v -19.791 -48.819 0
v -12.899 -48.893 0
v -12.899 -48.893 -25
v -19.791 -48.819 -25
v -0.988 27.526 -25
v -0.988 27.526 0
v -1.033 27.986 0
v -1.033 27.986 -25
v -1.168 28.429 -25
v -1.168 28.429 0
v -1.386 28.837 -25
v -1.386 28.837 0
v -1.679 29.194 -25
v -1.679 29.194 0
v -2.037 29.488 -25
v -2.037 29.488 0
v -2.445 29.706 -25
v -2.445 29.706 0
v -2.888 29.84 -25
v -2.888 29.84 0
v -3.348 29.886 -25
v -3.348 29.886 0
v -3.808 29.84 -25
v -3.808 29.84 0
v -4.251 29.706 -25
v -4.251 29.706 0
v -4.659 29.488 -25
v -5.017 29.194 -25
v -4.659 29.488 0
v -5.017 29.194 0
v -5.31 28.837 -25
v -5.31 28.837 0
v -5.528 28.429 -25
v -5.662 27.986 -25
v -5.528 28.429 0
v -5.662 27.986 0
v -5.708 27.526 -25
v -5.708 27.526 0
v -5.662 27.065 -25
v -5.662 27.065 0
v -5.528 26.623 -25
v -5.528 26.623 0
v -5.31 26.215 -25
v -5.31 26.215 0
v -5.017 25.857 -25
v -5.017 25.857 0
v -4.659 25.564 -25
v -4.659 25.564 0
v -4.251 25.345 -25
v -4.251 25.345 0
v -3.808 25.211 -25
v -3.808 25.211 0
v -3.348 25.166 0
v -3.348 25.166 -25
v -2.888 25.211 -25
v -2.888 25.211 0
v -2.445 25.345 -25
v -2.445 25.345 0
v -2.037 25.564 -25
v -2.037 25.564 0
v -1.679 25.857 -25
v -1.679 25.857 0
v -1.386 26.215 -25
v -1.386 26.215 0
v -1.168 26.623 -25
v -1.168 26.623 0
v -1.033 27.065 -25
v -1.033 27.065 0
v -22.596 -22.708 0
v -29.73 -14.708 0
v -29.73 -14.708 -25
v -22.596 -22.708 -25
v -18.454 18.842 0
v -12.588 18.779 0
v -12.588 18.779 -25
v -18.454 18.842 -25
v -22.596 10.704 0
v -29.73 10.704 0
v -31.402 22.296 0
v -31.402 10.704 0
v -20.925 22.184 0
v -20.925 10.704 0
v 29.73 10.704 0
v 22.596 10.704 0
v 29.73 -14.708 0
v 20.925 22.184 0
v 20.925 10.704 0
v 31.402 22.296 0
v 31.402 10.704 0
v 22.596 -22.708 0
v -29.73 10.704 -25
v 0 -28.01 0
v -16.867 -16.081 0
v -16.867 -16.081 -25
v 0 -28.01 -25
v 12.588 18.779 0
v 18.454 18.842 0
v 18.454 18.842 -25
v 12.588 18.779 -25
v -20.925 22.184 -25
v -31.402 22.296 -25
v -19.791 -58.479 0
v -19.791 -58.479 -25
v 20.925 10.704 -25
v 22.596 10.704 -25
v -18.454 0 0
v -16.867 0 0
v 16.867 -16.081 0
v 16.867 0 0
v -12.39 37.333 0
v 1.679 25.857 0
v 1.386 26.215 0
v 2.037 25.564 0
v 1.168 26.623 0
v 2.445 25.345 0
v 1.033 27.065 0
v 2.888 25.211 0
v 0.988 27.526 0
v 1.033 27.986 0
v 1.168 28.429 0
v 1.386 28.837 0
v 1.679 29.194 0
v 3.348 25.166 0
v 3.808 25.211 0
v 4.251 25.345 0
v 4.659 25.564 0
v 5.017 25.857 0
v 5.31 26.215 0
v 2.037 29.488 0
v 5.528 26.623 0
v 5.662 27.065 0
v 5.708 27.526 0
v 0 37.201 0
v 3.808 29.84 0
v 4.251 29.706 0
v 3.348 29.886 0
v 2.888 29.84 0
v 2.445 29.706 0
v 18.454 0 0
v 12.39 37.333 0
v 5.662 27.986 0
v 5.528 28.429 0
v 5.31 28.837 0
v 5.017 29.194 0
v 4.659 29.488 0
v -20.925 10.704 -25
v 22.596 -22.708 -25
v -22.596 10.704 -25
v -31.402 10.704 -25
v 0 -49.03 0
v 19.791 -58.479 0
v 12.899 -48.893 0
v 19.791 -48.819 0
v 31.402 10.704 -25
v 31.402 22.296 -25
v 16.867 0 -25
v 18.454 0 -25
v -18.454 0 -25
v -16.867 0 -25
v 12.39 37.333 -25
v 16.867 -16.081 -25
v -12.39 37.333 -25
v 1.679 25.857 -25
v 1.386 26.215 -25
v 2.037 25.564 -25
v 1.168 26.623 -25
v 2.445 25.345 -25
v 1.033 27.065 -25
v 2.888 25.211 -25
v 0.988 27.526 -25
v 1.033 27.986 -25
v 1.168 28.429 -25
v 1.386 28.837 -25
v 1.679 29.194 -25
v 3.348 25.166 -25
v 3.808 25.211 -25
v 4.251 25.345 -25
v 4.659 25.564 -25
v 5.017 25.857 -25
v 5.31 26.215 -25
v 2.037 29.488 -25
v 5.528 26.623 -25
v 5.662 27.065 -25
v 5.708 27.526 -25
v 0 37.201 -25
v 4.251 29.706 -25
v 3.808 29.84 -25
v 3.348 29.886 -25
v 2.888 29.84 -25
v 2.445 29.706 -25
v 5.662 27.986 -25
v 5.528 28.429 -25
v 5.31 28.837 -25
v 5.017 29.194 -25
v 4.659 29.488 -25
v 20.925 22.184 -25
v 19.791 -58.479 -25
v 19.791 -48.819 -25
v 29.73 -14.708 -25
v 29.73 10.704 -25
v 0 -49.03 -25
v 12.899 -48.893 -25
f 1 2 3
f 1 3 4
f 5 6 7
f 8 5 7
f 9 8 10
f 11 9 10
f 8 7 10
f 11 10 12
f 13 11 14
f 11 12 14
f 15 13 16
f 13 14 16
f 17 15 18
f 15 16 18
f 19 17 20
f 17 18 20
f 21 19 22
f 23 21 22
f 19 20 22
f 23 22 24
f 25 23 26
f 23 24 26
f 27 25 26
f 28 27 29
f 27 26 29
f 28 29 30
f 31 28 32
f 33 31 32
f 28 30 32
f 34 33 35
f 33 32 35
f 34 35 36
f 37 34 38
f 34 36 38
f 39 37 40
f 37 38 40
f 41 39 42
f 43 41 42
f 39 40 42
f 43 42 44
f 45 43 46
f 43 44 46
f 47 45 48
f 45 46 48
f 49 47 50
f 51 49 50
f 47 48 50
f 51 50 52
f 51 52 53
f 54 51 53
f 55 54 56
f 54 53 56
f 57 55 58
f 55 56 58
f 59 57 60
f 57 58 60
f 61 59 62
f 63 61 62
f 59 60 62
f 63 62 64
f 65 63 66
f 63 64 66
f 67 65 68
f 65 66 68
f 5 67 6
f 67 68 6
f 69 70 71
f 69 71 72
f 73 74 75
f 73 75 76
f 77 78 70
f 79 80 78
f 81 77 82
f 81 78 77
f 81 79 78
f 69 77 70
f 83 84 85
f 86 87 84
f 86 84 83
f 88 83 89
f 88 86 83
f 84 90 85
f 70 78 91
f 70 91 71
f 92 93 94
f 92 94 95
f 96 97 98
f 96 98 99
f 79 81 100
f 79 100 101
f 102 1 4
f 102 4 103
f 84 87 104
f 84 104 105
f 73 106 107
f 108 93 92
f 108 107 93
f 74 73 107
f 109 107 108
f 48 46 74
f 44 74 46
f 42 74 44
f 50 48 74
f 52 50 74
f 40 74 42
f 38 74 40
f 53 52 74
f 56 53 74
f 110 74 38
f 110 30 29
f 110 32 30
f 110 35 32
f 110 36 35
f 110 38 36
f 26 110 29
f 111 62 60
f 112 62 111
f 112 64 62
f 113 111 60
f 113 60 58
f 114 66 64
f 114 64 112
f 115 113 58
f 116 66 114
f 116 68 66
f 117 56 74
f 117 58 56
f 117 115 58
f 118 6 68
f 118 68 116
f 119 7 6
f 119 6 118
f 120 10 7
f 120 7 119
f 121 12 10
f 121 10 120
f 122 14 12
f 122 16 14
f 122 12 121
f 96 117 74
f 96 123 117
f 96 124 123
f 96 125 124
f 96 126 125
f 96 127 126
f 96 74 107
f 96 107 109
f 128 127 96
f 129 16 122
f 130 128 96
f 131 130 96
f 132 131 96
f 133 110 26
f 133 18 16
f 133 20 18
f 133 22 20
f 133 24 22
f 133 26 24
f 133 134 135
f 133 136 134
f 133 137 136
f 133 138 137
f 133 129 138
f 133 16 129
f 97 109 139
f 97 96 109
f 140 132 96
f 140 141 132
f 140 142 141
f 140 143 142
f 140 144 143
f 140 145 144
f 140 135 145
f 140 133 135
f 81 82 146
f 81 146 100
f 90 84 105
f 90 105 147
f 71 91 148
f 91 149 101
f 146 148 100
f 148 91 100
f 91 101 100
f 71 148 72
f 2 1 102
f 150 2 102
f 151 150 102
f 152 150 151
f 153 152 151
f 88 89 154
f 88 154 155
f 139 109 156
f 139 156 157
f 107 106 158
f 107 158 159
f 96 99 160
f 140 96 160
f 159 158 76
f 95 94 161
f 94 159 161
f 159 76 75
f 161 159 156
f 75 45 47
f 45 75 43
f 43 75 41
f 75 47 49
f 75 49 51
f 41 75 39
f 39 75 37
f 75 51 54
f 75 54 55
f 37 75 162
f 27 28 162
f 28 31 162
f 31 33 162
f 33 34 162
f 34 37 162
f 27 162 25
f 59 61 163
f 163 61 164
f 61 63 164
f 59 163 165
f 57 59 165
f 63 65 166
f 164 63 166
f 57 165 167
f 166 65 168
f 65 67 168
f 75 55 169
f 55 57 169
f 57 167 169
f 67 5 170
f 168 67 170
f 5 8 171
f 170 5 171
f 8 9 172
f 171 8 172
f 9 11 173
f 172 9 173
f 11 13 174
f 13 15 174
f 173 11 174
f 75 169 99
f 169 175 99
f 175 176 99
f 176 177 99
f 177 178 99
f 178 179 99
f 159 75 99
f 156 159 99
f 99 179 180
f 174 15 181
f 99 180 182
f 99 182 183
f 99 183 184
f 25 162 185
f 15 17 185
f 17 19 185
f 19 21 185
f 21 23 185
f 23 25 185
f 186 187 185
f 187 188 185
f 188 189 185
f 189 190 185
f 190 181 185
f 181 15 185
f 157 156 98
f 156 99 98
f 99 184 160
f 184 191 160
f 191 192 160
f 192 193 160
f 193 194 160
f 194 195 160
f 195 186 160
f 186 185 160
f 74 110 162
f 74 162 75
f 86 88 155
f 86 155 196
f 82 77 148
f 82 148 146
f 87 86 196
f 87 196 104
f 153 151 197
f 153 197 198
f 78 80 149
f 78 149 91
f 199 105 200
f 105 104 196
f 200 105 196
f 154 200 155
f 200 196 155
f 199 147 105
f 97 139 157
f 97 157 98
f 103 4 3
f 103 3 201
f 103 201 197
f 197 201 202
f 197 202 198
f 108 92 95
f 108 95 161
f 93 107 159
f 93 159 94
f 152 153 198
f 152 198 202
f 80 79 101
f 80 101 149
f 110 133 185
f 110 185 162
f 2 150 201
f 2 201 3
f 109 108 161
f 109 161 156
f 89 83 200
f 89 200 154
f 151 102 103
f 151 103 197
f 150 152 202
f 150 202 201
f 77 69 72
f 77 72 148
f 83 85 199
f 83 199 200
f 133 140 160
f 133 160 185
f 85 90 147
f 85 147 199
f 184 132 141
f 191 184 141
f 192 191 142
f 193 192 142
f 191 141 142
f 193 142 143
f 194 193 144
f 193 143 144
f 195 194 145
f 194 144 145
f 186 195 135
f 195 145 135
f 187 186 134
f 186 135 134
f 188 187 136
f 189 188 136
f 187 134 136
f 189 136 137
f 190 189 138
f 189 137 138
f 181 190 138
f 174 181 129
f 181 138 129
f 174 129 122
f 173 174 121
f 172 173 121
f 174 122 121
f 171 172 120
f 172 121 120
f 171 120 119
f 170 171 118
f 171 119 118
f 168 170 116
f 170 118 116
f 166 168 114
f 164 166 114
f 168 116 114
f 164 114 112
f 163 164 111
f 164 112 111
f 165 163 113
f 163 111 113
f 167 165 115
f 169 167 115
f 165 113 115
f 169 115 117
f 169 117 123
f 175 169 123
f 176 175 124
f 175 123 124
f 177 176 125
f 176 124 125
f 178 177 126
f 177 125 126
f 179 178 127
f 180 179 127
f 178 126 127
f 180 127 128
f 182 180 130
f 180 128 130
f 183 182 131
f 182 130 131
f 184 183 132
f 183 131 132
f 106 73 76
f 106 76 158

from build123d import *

# Parameters (mm, degrees)
F1_R     = 2.359873
F2_DEPTH = 25


with BuildPart() as f2:
    # F1 (on Top) → F2 (new body)
    with BuildSketch(Plane.XY):
        Polygon((-20.924984, 22.184219), (-31.401802, 22.295674), (-31.401802, 10.7043), (-29.72997, 10.7043), (-22.596437, 10.7043), (-20.924984, 10.7043), align=None)
        Polygon((-22.596437, 10.7043), (-29.72997, 10.7043), (-29.72997, -14.707558), (-22.596437, -14.783446), align=None)
        Polygon((-22.596437, -14.783446), (-29.72997, -14.707558), (-22.596437, -22.708369), align=None)
        Polygon((-16.867362, -16.081186), (0, -28.010119), (16.867362, -16.081186), (0, -16.260625), align=None)
        Polygon((-19.790943, -48.819479), (-19.790943, -58.478526), (19.790943, -58.478526), (19.790943, -48.819479), (12.898882, -48.892798), (0, -49.03002), (-12.898882, -48.892798), align=None)
        Polygon((-16.867362, 0), (-16.867362, -16.081186), (0, -16.260625), (16.867362, -16.081186), (16.867362, 0), (0, 0), align=None)
        Polygon((-18.454387, 0), (-16.867362, 0), (0, 0), (0, 18.645264), (-12.587854, 18.779177), (-18.454387, 18.841587), align=None)
        Polygon((0, 0), (16.867362, 0), (18.454387, 0), (18.454387, 18.841587), (12.587854, 18.779177), (0, 18.645264), align=None)
        Polygon((-12.587854, 18.779177), (0, 18.645264), (12.587854, 18.779177), (12.390475, 37.332833), (0, 37.20102), (-12.390475, 37.332833), align=None)
        with Locations((-3.347904, 27.525691)):
            Circle(F1_R, mode=Mode.SUBTRACT)
        with Locations((3.347904, 27.525691)):
            Circle(F1_R, mode=Mode.SUBTRACT)
        Polygon((31.401802, 22.295674), (20.924984, 22.184219), (20.924984, 10.7043), (22.596437, 10.7043), (29.72997, 10.7043), (31.401802, 10.7043), align=None)
        Polygon((29.72997, 10.7043), (22.596437, 10.7043), (22.596437, -14.783446), (29.72997, -14.707558), align=None)
        Polygon((29.72997, -14.707558), (22.596437, -14.783446), (22.596437, -22.708369), align=None)
    extrude(amount=-F2_DEPTH)


solid = f2.part
